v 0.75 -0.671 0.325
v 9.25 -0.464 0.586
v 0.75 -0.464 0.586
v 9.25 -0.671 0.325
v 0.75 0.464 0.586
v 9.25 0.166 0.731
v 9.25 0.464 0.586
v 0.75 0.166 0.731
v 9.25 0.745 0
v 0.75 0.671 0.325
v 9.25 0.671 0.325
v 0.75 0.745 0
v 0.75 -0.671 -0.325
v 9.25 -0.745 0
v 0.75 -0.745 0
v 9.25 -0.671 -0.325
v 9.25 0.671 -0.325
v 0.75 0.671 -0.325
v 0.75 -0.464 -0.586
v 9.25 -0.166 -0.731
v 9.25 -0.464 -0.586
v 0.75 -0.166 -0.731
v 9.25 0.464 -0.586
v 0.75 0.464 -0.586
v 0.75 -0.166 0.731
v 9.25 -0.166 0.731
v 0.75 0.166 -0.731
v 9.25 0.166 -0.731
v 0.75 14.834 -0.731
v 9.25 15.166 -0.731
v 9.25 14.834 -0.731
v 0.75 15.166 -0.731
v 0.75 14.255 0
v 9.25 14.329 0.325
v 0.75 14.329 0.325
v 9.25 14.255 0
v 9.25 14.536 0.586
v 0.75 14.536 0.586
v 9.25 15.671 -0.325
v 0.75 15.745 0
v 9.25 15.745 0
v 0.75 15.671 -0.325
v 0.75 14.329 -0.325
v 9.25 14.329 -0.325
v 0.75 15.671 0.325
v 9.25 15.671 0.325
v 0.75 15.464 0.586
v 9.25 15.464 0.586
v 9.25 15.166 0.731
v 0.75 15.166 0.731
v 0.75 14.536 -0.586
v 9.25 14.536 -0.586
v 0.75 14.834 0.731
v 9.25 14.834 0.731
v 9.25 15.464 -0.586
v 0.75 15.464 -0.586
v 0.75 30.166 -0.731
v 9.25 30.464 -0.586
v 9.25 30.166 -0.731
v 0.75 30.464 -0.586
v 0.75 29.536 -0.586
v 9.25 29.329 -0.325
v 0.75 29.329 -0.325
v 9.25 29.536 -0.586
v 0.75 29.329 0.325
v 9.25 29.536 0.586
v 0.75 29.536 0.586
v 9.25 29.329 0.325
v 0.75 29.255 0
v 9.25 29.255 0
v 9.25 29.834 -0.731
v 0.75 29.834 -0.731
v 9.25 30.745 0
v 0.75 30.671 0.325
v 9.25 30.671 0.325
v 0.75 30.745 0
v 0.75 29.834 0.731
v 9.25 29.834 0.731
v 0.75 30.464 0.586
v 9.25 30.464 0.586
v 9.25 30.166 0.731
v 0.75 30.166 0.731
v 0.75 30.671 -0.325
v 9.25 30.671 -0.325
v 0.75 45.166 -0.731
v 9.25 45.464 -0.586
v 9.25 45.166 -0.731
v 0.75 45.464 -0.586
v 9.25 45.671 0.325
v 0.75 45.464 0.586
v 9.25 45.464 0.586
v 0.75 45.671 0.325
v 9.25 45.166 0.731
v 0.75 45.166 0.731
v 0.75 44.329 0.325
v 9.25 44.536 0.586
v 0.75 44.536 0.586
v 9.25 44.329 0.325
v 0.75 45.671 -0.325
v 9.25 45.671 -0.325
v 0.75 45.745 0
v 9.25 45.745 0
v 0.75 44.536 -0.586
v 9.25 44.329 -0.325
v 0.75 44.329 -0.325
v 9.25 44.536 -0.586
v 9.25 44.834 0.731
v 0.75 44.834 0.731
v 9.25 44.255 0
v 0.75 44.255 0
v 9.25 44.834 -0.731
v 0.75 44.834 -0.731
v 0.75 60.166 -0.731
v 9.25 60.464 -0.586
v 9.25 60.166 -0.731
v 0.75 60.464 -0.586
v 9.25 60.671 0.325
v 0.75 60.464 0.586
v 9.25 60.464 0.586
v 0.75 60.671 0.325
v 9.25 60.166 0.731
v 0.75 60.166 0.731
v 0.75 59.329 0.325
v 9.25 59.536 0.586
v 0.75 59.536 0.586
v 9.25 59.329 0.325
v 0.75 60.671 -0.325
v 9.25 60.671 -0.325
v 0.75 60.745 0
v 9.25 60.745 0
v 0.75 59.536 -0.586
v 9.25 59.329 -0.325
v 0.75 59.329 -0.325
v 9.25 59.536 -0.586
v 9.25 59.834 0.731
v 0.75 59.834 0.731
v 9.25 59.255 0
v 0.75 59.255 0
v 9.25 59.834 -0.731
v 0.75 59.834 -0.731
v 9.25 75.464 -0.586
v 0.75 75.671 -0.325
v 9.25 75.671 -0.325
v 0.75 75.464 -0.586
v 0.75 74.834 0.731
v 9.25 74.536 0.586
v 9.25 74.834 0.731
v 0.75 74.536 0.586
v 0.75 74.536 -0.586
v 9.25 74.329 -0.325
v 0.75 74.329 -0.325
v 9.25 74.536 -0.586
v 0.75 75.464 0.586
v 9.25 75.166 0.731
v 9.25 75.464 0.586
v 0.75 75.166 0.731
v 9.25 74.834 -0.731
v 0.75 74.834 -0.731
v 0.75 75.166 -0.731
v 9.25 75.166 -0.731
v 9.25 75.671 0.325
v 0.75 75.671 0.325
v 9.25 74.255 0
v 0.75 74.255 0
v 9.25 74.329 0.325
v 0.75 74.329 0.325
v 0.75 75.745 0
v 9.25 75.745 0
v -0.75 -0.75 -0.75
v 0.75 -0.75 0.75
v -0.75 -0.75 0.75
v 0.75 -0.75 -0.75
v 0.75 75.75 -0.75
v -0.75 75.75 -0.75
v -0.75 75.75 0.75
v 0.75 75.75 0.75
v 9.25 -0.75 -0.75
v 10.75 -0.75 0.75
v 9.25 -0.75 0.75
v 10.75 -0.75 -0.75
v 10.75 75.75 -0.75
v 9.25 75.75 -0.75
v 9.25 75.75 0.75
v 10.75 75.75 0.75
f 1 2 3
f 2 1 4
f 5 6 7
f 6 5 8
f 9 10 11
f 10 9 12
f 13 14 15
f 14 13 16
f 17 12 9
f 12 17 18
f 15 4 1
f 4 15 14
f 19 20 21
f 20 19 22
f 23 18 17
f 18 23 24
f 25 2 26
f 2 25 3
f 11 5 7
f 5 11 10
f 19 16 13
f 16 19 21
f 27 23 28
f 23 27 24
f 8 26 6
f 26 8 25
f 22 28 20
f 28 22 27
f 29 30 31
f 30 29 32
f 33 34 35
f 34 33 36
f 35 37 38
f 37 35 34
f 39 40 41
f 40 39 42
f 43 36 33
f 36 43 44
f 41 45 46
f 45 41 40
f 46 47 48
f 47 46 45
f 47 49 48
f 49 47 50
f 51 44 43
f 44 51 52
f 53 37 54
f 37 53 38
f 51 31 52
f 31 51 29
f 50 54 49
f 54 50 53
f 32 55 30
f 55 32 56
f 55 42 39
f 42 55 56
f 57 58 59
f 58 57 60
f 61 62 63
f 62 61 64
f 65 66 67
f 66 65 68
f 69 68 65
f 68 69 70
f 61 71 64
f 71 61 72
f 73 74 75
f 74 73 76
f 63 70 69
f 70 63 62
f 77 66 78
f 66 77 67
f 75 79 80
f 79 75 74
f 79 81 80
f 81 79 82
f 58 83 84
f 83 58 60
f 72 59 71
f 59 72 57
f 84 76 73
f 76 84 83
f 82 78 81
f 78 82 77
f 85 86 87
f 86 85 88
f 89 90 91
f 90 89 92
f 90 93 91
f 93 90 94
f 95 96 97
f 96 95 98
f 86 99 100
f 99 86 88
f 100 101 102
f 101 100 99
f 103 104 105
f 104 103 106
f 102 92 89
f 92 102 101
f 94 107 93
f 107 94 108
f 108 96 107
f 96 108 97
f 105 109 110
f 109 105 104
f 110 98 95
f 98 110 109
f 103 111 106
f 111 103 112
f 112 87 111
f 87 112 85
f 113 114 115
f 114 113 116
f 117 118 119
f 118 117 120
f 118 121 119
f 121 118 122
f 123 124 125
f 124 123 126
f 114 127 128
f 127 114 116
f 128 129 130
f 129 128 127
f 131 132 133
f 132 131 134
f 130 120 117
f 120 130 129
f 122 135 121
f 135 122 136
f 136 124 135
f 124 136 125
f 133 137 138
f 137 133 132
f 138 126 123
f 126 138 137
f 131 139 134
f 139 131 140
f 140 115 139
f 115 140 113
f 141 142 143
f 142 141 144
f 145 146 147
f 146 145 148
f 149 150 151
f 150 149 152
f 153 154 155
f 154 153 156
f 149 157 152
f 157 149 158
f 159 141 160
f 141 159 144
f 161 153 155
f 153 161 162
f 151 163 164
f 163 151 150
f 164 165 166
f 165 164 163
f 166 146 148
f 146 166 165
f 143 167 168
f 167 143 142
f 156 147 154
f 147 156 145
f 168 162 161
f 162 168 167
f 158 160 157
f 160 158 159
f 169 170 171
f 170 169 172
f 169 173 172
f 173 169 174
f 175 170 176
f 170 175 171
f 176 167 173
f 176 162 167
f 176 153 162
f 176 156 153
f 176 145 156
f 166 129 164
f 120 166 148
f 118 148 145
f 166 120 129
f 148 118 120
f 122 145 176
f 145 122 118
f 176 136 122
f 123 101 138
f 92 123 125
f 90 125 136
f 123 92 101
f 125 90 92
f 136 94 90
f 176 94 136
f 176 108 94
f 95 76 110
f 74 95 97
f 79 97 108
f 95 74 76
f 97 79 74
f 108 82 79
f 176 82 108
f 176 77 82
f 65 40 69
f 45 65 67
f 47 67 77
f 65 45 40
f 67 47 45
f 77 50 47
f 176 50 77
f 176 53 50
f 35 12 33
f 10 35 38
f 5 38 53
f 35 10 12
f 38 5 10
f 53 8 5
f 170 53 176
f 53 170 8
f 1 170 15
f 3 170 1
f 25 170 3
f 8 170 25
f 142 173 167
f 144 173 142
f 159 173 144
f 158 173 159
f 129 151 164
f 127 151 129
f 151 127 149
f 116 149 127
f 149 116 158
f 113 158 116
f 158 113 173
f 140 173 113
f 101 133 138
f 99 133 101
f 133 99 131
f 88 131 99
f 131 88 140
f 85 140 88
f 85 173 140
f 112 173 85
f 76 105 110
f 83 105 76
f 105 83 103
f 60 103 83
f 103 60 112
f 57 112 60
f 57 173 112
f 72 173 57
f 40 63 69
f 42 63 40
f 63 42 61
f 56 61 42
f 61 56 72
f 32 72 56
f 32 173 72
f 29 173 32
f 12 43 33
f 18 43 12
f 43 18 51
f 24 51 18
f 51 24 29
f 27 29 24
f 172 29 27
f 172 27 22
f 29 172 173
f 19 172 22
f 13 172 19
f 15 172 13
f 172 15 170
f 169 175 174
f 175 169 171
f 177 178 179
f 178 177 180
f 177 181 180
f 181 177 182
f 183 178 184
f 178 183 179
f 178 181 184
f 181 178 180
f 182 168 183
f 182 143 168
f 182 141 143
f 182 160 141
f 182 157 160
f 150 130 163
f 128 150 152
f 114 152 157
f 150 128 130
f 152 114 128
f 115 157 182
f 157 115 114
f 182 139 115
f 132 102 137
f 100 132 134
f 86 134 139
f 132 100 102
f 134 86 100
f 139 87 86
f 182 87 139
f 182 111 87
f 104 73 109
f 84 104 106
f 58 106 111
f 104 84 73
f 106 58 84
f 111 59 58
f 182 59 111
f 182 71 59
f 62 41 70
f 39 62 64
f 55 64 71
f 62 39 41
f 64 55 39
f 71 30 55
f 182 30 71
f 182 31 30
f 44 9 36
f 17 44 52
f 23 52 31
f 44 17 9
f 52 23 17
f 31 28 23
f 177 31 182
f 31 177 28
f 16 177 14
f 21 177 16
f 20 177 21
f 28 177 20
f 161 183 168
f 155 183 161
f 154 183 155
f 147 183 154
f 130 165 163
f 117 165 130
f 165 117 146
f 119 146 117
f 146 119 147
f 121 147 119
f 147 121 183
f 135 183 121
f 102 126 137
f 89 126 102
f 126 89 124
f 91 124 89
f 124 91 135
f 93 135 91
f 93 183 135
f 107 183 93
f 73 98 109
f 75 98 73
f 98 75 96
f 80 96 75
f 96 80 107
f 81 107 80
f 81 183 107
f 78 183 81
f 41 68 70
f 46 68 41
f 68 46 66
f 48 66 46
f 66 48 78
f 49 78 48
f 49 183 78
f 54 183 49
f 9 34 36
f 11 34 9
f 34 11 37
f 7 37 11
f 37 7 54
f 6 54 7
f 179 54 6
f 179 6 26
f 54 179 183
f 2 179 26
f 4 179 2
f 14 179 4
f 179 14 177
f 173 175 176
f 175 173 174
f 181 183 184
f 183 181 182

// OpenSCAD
// file: turtle.scad
use <affine.scad>

ident = a_S();
function mreduce(x) = let(lx=len(x))

    (lx>1 ? a_Xa(x[0], mreduce([for(i=[1:lx-1]) x[i]])  )
         : x[0]
    );
    
function mcume(in,out=[],next=ident) = let(li=len(in),lo=len(out))
    li == 0 ? out 
            :          
               mcume( 
                     li-1>0 ? [for(i=[1:li-1]) in[i]] : [],
                     lo>0 ? concat(out,[a_Xa(out[lo-1],next)]) : [in[0]],
                     in[1] 
                   );

function setPath(spec) =
   mcume([for(i=spec) mreduce(i)]);
        
module turtlePath(path,mod=[1,1],cycle=false,rawpath=[])
{  
  usePath = rawpath ? rawpath : setPath(path); 
  if(mod)
  {
    for(i=[0:len(usePath)-1])
    {
      if(i%mod[0]==0)
      { hull()
        {
          apply(usePath[i]){children();}
          if(len(mod)>1)
          {
            for(j=[1:len(mod)-1])
            {
              if(i+mod[j]<len(usePath))
              {
                apply(usePath[i+mod[j]]){children();} 
              }
              else
              { 
                if(cycle)
                {        
                 apply(usePath[(i+mod[j])%len(usePath)]){children();}
                }   
  } } } } } } }
  else
  {
    for(i=usePath) apply(i){children();}   
  }    
}  


///Generate affine turtle moves
///These should have more intuitive names

function turnRight(deg) = a_Rv(deg,[0,0,1]);
function turnLeft(deg) = a_Rv(deg,[0,0,-1]);
function turnUp(deg) = a_Rv(deg,[-1,0,0]);
function turnDown(deg) = a_Rv(deg,[1,0,0]);                     
function go(distance) = a_S(off=[0,distance,0]);
function goTo(vec) = a_S(off=vec);
function rollRight(deg) = a_Rv(deg,[0,-1,0]); 
function rollLeft(deg) = a_Rv(deg,[0,1,0]);
function reSize(vecA) = a_S(vec =(vecA[0]==undef ? [vecA,vecA,vecA] : vecA));  
function lookAt(vec) = a_Xa(
                             turnRight(atan(vec[0]/vec[1])),
                             ((len(vec)==3) ? 
                             turnUp(90-atan(norm([vec[0],vec[1]])/vec[2])) 
                             : ident
                             )
                           );                          
function lookGo(vec) = a_Xa(lookAt(vec),go(norm(vec)));



   
                     
         
// main file
use <turtle.scad>     
$fn=13;
function ladderPath(xdim,ydim,steps=1) =  ///steps should be one or greater..
    concat(
           [[go(0)],[goTo([xdim,0,0])]],
           [for(i=[0:steps-1]) for(j=[0:1]) [j ? goTo([xdim,0,0]) : goTo([-xdim,ydim,0])]]
          );
ladder = ladderPath(10,15,5);         
turtlePath(ladder,mod=[2,1]){sphere(.75);}
turtlePath(ladder,mod=[1,2]){cube(1.5,center=true);}
